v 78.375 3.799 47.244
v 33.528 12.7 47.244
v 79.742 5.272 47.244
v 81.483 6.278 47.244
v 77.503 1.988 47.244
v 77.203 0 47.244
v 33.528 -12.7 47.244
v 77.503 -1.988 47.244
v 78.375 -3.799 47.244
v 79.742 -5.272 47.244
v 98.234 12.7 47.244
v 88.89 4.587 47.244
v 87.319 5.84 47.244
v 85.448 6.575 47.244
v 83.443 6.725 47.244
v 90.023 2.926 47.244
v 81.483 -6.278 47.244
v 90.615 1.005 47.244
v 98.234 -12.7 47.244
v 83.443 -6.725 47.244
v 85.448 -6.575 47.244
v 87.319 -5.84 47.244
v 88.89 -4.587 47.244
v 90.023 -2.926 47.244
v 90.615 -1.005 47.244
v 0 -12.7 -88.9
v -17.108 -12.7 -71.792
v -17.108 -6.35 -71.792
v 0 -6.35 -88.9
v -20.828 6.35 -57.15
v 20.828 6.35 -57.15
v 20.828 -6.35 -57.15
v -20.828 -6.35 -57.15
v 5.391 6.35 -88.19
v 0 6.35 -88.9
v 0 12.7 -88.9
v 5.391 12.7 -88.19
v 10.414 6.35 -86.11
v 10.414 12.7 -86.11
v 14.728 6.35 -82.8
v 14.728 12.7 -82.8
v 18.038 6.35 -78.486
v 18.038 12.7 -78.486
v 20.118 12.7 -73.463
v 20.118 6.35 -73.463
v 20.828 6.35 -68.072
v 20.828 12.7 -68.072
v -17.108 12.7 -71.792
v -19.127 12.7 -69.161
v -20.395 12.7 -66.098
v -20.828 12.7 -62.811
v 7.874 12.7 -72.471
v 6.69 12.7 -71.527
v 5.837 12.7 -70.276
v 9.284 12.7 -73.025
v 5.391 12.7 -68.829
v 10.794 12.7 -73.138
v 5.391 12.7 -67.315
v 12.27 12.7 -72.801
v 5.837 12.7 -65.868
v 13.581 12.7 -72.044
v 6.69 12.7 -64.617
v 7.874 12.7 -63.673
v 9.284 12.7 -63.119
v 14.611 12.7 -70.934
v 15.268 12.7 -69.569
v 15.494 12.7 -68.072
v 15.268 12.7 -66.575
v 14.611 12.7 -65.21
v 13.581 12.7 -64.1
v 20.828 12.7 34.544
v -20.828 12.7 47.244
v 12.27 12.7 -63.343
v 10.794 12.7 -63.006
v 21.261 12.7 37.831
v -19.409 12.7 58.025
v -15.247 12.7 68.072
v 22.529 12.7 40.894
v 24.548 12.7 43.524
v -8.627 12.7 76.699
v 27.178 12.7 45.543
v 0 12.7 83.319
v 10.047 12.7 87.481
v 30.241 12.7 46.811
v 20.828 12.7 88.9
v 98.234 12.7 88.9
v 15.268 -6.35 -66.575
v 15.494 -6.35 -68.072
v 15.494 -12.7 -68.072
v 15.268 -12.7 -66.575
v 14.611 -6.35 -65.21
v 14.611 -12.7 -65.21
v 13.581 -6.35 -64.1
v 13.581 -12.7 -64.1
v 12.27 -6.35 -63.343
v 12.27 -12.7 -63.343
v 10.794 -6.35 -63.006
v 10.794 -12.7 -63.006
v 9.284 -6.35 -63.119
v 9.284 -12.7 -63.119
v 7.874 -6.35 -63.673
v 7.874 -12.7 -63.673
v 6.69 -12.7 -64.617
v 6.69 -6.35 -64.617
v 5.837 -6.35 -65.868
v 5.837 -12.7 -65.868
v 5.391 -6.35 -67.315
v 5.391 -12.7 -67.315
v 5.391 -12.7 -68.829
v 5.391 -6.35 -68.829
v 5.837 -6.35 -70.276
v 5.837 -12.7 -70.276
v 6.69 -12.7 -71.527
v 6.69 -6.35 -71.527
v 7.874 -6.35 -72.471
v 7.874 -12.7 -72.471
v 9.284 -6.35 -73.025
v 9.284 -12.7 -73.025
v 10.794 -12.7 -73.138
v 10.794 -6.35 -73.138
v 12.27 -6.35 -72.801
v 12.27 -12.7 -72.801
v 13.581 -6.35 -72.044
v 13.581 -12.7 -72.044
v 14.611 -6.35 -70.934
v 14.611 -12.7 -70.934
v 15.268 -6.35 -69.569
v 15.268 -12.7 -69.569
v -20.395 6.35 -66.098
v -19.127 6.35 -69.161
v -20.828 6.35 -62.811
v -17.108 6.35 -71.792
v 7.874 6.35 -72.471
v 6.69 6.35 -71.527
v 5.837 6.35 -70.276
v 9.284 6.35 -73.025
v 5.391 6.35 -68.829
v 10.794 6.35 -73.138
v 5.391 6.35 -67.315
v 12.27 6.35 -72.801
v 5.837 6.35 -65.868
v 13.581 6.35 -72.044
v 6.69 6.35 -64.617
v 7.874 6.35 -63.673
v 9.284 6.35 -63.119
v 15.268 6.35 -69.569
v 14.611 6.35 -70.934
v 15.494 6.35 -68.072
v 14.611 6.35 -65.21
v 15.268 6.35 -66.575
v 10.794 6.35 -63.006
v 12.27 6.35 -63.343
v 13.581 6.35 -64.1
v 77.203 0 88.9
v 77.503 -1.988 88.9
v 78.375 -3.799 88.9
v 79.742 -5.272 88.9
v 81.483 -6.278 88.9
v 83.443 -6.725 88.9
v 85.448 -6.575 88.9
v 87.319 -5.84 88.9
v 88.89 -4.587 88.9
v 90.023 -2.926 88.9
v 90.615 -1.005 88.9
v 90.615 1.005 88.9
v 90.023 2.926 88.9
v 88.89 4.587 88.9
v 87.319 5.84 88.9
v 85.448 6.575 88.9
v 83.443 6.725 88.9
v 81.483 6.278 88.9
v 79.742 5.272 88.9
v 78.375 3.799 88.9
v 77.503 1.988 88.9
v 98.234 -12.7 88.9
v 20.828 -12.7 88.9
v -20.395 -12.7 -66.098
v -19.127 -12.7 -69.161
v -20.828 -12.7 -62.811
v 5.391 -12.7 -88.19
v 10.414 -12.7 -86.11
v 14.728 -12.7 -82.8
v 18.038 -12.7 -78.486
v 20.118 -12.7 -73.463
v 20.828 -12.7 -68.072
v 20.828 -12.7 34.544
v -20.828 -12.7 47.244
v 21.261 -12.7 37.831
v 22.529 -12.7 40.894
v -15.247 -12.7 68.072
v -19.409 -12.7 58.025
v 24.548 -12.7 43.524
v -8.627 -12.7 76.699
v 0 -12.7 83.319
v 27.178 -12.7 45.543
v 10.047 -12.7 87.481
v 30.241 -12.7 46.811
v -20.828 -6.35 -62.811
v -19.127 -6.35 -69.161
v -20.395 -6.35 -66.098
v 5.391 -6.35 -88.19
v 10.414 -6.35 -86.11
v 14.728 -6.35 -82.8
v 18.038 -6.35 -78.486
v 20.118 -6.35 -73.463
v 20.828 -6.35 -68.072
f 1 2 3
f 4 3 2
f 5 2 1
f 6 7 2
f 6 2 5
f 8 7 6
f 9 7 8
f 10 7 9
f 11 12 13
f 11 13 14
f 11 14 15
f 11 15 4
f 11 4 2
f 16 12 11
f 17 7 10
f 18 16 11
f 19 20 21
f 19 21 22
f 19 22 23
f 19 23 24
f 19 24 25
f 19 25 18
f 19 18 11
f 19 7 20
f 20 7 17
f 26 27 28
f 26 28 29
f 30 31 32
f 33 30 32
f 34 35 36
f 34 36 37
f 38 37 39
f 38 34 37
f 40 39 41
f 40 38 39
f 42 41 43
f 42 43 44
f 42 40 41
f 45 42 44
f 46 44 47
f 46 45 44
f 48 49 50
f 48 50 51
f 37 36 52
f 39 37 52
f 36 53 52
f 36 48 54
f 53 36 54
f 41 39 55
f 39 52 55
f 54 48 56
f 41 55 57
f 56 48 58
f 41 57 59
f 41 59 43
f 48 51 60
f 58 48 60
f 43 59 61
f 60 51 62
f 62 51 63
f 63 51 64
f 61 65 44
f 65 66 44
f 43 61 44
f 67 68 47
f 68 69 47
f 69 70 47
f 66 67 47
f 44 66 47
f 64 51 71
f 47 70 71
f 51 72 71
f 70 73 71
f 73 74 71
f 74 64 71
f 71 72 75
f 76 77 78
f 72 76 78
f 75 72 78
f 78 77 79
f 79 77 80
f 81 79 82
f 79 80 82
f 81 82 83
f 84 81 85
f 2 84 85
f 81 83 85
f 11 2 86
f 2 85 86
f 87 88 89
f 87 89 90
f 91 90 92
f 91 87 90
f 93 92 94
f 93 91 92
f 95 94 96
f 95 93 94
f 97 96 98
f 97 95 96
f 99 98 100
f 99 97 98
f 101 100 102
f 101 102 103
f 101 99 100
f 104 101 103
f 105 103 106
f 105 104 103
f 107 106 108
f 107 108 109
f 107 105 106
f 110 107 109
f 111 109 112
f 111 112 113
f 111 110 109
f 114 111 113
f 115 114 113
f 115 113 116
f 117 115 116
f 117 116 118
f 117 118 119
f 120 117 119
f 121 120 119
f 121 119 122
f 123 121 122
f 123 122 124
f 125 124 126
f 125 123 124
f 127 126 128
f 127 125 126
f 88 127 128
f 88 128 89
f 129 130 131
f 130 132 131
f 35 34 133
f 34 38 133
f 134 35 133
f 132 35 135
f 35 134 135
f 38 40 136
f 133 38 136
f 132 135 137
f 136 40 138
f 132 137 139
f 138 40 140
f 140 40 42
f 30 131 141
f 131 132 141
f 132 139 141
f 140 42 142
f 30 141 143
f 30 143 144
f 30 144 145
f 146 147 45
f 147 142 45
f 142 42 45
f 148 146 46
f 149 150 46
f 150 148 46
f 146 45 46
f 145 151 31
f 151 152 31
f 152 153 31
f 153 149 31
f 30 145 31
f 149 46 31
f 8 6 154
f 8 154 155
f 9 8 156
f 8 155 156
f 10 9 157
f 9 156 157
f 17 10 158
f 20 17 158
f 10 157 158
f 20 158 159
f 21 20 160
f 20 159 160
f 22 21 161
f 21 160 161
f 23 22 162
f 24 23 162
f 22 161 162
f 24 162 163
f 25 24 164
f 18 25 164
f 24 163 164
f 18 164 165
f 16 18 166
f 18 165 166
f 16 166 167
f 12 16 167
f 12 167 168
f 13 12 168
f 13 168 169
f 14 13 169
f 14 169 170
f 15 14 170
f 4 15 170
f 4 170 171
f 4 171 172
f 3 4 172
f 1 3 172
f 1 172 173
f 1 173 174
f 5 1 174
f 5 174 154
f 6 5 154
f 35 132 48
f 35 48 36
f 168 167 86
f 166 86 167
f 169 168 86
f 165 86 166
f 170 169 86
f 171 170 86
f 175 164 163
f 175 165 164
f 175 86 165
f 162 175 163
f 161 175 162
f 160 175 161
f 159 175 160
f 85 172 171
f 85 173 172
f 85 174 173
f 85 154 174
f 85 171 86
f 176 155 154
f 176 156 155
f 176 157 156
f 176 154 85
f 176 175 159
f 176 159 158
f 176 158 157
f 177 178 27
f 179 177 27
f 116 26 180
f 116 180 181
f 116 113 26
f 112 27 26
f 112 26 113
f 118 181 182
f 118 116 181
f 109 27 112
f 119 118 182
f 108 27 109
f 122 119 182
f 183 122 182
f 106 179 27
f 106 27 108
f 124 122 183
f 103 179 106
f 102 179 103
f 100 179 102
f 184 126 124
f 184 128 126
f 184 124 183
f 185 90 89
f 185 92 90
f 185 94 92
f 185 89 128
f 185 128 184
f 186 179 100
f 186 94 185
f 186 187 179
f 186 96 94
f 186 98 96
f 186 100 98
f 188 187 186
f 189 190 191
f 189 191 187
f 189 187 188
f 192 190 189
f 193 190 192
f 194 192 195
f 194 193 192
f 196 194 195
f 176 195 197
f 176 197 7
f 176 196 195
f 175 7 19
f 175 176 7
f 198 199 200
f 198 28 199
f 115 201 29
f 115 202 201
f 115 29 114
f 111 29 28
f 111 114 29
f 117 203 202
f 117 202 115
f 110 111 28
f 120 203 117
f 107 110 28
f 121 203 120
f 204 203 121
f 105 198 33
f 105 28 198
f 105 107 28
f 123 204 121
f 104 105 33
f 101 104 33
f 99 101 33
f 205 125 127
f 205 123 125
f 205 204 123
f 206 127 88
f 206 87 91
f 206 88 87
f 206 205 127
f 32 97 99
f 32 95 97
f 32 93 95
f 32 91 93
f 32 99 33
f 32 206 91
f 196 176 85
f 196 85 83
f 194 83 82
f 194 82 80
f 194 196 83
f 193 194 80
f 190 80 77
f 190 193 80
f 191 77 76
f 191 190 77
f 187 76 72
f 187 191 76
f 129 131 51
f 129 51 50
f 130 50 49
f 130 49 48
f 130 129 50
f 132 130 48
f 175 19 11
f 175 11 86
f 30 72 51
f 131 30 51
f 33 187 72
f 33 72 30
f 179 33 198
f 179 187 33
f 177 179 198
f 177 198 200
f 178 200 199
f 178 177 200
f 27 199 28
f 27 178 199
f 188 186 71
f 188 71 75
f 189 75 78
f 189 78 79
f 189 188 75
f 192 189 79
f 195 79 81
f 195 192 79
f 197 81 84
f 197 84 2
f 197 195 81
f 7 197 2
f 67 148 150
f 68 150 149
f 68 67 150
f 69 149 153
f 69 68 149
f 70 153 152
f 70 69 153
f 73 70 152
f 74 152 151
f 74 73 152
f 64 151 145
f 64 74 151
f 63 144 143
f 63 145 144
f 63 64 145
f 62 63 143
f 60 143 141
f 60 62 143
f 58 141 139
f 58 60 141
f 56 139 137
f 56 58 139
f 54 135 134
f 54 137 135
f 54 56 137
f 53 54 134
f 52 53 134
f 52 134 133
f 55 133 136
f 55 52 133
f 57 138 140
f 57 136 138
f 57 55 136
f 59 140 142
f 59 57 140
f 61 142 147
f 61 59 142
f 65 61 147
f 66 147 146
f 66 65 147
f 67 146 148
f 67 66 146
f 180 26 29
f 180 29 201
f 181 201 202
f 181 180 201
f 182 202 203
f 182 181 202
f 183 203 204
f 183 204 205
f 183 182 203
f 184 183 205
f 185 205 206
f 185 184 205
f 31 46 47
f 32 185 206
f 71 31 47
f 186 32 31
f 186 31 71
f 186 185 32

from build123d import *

# Parameters (mm, degrees)
F0_R     = 5.08
F1_DEPTH = 12.7
F3_D     = 13.4874
F4_W     = 6.35
F4_H     = 31.75
F5_DEPTH = 50.8


with BuildPart() as f1:
    # F0 (on Front) → F1 (new body, symmetric)
    with BuildSketch(Plane.XZ):
        with BuildLine():
            Line((20.828, -68.072), (20.828, 34.544))
            ThreePointArc((20.828, 34.544), (24.547744, 43.524256), (33.528, 47.244))
            Line((33.528, 47.244), (98.2345, 47.244))
            Line((98.2345, 47.244), (98.2345, 88.9))
            Line((98.2345, 88.9), (20.828, 88.9))
            ThreePointArc((20.828, 88.9), (-8.62724, 76.69924), (-20.828, 47.244))
            Line((-20.828, 47.244), (-20.828, -62.811488))
            ThreePointArc((-20.828, -62.811488), (-19.86127, -67.671567), (-17.108256, -71.791744))
            Line((-17.108256, -71.791744), (0, -88.9))
            ThreePointArc((0, -88.9), (14.72762, -82.79962), (20.828, -68.072))
        make_face()
        with Locations((10.414, -68.072)):
            Circle(F0_R, mode=Mode.SUBTRACT)
    extrude(amount=F1_DEPTH, both=True)

    # F3 (through all)
    with Locations(Plane(origin=(0, 0, 0), x_dir=(1, 0, 0), z_dir=(0, 0, -1))):
        with Locations((83.947, 0)):
            Hole(F3_D / 2)

    # F4 (on Right) → F5 (cut, symmetric)
    with BuildSketch(Plane.YZ):
        with Locations((3.175, -73.025)):
            Rectangle(F4_W, F4_H)
        with Locations((-3.175, -73.025)):
            Rectangle(F4_W, F4_H)
    extrude(amount=F5_DEPTH, both=True, mode=Mode.SUBTRACT)


solid = f1.part
